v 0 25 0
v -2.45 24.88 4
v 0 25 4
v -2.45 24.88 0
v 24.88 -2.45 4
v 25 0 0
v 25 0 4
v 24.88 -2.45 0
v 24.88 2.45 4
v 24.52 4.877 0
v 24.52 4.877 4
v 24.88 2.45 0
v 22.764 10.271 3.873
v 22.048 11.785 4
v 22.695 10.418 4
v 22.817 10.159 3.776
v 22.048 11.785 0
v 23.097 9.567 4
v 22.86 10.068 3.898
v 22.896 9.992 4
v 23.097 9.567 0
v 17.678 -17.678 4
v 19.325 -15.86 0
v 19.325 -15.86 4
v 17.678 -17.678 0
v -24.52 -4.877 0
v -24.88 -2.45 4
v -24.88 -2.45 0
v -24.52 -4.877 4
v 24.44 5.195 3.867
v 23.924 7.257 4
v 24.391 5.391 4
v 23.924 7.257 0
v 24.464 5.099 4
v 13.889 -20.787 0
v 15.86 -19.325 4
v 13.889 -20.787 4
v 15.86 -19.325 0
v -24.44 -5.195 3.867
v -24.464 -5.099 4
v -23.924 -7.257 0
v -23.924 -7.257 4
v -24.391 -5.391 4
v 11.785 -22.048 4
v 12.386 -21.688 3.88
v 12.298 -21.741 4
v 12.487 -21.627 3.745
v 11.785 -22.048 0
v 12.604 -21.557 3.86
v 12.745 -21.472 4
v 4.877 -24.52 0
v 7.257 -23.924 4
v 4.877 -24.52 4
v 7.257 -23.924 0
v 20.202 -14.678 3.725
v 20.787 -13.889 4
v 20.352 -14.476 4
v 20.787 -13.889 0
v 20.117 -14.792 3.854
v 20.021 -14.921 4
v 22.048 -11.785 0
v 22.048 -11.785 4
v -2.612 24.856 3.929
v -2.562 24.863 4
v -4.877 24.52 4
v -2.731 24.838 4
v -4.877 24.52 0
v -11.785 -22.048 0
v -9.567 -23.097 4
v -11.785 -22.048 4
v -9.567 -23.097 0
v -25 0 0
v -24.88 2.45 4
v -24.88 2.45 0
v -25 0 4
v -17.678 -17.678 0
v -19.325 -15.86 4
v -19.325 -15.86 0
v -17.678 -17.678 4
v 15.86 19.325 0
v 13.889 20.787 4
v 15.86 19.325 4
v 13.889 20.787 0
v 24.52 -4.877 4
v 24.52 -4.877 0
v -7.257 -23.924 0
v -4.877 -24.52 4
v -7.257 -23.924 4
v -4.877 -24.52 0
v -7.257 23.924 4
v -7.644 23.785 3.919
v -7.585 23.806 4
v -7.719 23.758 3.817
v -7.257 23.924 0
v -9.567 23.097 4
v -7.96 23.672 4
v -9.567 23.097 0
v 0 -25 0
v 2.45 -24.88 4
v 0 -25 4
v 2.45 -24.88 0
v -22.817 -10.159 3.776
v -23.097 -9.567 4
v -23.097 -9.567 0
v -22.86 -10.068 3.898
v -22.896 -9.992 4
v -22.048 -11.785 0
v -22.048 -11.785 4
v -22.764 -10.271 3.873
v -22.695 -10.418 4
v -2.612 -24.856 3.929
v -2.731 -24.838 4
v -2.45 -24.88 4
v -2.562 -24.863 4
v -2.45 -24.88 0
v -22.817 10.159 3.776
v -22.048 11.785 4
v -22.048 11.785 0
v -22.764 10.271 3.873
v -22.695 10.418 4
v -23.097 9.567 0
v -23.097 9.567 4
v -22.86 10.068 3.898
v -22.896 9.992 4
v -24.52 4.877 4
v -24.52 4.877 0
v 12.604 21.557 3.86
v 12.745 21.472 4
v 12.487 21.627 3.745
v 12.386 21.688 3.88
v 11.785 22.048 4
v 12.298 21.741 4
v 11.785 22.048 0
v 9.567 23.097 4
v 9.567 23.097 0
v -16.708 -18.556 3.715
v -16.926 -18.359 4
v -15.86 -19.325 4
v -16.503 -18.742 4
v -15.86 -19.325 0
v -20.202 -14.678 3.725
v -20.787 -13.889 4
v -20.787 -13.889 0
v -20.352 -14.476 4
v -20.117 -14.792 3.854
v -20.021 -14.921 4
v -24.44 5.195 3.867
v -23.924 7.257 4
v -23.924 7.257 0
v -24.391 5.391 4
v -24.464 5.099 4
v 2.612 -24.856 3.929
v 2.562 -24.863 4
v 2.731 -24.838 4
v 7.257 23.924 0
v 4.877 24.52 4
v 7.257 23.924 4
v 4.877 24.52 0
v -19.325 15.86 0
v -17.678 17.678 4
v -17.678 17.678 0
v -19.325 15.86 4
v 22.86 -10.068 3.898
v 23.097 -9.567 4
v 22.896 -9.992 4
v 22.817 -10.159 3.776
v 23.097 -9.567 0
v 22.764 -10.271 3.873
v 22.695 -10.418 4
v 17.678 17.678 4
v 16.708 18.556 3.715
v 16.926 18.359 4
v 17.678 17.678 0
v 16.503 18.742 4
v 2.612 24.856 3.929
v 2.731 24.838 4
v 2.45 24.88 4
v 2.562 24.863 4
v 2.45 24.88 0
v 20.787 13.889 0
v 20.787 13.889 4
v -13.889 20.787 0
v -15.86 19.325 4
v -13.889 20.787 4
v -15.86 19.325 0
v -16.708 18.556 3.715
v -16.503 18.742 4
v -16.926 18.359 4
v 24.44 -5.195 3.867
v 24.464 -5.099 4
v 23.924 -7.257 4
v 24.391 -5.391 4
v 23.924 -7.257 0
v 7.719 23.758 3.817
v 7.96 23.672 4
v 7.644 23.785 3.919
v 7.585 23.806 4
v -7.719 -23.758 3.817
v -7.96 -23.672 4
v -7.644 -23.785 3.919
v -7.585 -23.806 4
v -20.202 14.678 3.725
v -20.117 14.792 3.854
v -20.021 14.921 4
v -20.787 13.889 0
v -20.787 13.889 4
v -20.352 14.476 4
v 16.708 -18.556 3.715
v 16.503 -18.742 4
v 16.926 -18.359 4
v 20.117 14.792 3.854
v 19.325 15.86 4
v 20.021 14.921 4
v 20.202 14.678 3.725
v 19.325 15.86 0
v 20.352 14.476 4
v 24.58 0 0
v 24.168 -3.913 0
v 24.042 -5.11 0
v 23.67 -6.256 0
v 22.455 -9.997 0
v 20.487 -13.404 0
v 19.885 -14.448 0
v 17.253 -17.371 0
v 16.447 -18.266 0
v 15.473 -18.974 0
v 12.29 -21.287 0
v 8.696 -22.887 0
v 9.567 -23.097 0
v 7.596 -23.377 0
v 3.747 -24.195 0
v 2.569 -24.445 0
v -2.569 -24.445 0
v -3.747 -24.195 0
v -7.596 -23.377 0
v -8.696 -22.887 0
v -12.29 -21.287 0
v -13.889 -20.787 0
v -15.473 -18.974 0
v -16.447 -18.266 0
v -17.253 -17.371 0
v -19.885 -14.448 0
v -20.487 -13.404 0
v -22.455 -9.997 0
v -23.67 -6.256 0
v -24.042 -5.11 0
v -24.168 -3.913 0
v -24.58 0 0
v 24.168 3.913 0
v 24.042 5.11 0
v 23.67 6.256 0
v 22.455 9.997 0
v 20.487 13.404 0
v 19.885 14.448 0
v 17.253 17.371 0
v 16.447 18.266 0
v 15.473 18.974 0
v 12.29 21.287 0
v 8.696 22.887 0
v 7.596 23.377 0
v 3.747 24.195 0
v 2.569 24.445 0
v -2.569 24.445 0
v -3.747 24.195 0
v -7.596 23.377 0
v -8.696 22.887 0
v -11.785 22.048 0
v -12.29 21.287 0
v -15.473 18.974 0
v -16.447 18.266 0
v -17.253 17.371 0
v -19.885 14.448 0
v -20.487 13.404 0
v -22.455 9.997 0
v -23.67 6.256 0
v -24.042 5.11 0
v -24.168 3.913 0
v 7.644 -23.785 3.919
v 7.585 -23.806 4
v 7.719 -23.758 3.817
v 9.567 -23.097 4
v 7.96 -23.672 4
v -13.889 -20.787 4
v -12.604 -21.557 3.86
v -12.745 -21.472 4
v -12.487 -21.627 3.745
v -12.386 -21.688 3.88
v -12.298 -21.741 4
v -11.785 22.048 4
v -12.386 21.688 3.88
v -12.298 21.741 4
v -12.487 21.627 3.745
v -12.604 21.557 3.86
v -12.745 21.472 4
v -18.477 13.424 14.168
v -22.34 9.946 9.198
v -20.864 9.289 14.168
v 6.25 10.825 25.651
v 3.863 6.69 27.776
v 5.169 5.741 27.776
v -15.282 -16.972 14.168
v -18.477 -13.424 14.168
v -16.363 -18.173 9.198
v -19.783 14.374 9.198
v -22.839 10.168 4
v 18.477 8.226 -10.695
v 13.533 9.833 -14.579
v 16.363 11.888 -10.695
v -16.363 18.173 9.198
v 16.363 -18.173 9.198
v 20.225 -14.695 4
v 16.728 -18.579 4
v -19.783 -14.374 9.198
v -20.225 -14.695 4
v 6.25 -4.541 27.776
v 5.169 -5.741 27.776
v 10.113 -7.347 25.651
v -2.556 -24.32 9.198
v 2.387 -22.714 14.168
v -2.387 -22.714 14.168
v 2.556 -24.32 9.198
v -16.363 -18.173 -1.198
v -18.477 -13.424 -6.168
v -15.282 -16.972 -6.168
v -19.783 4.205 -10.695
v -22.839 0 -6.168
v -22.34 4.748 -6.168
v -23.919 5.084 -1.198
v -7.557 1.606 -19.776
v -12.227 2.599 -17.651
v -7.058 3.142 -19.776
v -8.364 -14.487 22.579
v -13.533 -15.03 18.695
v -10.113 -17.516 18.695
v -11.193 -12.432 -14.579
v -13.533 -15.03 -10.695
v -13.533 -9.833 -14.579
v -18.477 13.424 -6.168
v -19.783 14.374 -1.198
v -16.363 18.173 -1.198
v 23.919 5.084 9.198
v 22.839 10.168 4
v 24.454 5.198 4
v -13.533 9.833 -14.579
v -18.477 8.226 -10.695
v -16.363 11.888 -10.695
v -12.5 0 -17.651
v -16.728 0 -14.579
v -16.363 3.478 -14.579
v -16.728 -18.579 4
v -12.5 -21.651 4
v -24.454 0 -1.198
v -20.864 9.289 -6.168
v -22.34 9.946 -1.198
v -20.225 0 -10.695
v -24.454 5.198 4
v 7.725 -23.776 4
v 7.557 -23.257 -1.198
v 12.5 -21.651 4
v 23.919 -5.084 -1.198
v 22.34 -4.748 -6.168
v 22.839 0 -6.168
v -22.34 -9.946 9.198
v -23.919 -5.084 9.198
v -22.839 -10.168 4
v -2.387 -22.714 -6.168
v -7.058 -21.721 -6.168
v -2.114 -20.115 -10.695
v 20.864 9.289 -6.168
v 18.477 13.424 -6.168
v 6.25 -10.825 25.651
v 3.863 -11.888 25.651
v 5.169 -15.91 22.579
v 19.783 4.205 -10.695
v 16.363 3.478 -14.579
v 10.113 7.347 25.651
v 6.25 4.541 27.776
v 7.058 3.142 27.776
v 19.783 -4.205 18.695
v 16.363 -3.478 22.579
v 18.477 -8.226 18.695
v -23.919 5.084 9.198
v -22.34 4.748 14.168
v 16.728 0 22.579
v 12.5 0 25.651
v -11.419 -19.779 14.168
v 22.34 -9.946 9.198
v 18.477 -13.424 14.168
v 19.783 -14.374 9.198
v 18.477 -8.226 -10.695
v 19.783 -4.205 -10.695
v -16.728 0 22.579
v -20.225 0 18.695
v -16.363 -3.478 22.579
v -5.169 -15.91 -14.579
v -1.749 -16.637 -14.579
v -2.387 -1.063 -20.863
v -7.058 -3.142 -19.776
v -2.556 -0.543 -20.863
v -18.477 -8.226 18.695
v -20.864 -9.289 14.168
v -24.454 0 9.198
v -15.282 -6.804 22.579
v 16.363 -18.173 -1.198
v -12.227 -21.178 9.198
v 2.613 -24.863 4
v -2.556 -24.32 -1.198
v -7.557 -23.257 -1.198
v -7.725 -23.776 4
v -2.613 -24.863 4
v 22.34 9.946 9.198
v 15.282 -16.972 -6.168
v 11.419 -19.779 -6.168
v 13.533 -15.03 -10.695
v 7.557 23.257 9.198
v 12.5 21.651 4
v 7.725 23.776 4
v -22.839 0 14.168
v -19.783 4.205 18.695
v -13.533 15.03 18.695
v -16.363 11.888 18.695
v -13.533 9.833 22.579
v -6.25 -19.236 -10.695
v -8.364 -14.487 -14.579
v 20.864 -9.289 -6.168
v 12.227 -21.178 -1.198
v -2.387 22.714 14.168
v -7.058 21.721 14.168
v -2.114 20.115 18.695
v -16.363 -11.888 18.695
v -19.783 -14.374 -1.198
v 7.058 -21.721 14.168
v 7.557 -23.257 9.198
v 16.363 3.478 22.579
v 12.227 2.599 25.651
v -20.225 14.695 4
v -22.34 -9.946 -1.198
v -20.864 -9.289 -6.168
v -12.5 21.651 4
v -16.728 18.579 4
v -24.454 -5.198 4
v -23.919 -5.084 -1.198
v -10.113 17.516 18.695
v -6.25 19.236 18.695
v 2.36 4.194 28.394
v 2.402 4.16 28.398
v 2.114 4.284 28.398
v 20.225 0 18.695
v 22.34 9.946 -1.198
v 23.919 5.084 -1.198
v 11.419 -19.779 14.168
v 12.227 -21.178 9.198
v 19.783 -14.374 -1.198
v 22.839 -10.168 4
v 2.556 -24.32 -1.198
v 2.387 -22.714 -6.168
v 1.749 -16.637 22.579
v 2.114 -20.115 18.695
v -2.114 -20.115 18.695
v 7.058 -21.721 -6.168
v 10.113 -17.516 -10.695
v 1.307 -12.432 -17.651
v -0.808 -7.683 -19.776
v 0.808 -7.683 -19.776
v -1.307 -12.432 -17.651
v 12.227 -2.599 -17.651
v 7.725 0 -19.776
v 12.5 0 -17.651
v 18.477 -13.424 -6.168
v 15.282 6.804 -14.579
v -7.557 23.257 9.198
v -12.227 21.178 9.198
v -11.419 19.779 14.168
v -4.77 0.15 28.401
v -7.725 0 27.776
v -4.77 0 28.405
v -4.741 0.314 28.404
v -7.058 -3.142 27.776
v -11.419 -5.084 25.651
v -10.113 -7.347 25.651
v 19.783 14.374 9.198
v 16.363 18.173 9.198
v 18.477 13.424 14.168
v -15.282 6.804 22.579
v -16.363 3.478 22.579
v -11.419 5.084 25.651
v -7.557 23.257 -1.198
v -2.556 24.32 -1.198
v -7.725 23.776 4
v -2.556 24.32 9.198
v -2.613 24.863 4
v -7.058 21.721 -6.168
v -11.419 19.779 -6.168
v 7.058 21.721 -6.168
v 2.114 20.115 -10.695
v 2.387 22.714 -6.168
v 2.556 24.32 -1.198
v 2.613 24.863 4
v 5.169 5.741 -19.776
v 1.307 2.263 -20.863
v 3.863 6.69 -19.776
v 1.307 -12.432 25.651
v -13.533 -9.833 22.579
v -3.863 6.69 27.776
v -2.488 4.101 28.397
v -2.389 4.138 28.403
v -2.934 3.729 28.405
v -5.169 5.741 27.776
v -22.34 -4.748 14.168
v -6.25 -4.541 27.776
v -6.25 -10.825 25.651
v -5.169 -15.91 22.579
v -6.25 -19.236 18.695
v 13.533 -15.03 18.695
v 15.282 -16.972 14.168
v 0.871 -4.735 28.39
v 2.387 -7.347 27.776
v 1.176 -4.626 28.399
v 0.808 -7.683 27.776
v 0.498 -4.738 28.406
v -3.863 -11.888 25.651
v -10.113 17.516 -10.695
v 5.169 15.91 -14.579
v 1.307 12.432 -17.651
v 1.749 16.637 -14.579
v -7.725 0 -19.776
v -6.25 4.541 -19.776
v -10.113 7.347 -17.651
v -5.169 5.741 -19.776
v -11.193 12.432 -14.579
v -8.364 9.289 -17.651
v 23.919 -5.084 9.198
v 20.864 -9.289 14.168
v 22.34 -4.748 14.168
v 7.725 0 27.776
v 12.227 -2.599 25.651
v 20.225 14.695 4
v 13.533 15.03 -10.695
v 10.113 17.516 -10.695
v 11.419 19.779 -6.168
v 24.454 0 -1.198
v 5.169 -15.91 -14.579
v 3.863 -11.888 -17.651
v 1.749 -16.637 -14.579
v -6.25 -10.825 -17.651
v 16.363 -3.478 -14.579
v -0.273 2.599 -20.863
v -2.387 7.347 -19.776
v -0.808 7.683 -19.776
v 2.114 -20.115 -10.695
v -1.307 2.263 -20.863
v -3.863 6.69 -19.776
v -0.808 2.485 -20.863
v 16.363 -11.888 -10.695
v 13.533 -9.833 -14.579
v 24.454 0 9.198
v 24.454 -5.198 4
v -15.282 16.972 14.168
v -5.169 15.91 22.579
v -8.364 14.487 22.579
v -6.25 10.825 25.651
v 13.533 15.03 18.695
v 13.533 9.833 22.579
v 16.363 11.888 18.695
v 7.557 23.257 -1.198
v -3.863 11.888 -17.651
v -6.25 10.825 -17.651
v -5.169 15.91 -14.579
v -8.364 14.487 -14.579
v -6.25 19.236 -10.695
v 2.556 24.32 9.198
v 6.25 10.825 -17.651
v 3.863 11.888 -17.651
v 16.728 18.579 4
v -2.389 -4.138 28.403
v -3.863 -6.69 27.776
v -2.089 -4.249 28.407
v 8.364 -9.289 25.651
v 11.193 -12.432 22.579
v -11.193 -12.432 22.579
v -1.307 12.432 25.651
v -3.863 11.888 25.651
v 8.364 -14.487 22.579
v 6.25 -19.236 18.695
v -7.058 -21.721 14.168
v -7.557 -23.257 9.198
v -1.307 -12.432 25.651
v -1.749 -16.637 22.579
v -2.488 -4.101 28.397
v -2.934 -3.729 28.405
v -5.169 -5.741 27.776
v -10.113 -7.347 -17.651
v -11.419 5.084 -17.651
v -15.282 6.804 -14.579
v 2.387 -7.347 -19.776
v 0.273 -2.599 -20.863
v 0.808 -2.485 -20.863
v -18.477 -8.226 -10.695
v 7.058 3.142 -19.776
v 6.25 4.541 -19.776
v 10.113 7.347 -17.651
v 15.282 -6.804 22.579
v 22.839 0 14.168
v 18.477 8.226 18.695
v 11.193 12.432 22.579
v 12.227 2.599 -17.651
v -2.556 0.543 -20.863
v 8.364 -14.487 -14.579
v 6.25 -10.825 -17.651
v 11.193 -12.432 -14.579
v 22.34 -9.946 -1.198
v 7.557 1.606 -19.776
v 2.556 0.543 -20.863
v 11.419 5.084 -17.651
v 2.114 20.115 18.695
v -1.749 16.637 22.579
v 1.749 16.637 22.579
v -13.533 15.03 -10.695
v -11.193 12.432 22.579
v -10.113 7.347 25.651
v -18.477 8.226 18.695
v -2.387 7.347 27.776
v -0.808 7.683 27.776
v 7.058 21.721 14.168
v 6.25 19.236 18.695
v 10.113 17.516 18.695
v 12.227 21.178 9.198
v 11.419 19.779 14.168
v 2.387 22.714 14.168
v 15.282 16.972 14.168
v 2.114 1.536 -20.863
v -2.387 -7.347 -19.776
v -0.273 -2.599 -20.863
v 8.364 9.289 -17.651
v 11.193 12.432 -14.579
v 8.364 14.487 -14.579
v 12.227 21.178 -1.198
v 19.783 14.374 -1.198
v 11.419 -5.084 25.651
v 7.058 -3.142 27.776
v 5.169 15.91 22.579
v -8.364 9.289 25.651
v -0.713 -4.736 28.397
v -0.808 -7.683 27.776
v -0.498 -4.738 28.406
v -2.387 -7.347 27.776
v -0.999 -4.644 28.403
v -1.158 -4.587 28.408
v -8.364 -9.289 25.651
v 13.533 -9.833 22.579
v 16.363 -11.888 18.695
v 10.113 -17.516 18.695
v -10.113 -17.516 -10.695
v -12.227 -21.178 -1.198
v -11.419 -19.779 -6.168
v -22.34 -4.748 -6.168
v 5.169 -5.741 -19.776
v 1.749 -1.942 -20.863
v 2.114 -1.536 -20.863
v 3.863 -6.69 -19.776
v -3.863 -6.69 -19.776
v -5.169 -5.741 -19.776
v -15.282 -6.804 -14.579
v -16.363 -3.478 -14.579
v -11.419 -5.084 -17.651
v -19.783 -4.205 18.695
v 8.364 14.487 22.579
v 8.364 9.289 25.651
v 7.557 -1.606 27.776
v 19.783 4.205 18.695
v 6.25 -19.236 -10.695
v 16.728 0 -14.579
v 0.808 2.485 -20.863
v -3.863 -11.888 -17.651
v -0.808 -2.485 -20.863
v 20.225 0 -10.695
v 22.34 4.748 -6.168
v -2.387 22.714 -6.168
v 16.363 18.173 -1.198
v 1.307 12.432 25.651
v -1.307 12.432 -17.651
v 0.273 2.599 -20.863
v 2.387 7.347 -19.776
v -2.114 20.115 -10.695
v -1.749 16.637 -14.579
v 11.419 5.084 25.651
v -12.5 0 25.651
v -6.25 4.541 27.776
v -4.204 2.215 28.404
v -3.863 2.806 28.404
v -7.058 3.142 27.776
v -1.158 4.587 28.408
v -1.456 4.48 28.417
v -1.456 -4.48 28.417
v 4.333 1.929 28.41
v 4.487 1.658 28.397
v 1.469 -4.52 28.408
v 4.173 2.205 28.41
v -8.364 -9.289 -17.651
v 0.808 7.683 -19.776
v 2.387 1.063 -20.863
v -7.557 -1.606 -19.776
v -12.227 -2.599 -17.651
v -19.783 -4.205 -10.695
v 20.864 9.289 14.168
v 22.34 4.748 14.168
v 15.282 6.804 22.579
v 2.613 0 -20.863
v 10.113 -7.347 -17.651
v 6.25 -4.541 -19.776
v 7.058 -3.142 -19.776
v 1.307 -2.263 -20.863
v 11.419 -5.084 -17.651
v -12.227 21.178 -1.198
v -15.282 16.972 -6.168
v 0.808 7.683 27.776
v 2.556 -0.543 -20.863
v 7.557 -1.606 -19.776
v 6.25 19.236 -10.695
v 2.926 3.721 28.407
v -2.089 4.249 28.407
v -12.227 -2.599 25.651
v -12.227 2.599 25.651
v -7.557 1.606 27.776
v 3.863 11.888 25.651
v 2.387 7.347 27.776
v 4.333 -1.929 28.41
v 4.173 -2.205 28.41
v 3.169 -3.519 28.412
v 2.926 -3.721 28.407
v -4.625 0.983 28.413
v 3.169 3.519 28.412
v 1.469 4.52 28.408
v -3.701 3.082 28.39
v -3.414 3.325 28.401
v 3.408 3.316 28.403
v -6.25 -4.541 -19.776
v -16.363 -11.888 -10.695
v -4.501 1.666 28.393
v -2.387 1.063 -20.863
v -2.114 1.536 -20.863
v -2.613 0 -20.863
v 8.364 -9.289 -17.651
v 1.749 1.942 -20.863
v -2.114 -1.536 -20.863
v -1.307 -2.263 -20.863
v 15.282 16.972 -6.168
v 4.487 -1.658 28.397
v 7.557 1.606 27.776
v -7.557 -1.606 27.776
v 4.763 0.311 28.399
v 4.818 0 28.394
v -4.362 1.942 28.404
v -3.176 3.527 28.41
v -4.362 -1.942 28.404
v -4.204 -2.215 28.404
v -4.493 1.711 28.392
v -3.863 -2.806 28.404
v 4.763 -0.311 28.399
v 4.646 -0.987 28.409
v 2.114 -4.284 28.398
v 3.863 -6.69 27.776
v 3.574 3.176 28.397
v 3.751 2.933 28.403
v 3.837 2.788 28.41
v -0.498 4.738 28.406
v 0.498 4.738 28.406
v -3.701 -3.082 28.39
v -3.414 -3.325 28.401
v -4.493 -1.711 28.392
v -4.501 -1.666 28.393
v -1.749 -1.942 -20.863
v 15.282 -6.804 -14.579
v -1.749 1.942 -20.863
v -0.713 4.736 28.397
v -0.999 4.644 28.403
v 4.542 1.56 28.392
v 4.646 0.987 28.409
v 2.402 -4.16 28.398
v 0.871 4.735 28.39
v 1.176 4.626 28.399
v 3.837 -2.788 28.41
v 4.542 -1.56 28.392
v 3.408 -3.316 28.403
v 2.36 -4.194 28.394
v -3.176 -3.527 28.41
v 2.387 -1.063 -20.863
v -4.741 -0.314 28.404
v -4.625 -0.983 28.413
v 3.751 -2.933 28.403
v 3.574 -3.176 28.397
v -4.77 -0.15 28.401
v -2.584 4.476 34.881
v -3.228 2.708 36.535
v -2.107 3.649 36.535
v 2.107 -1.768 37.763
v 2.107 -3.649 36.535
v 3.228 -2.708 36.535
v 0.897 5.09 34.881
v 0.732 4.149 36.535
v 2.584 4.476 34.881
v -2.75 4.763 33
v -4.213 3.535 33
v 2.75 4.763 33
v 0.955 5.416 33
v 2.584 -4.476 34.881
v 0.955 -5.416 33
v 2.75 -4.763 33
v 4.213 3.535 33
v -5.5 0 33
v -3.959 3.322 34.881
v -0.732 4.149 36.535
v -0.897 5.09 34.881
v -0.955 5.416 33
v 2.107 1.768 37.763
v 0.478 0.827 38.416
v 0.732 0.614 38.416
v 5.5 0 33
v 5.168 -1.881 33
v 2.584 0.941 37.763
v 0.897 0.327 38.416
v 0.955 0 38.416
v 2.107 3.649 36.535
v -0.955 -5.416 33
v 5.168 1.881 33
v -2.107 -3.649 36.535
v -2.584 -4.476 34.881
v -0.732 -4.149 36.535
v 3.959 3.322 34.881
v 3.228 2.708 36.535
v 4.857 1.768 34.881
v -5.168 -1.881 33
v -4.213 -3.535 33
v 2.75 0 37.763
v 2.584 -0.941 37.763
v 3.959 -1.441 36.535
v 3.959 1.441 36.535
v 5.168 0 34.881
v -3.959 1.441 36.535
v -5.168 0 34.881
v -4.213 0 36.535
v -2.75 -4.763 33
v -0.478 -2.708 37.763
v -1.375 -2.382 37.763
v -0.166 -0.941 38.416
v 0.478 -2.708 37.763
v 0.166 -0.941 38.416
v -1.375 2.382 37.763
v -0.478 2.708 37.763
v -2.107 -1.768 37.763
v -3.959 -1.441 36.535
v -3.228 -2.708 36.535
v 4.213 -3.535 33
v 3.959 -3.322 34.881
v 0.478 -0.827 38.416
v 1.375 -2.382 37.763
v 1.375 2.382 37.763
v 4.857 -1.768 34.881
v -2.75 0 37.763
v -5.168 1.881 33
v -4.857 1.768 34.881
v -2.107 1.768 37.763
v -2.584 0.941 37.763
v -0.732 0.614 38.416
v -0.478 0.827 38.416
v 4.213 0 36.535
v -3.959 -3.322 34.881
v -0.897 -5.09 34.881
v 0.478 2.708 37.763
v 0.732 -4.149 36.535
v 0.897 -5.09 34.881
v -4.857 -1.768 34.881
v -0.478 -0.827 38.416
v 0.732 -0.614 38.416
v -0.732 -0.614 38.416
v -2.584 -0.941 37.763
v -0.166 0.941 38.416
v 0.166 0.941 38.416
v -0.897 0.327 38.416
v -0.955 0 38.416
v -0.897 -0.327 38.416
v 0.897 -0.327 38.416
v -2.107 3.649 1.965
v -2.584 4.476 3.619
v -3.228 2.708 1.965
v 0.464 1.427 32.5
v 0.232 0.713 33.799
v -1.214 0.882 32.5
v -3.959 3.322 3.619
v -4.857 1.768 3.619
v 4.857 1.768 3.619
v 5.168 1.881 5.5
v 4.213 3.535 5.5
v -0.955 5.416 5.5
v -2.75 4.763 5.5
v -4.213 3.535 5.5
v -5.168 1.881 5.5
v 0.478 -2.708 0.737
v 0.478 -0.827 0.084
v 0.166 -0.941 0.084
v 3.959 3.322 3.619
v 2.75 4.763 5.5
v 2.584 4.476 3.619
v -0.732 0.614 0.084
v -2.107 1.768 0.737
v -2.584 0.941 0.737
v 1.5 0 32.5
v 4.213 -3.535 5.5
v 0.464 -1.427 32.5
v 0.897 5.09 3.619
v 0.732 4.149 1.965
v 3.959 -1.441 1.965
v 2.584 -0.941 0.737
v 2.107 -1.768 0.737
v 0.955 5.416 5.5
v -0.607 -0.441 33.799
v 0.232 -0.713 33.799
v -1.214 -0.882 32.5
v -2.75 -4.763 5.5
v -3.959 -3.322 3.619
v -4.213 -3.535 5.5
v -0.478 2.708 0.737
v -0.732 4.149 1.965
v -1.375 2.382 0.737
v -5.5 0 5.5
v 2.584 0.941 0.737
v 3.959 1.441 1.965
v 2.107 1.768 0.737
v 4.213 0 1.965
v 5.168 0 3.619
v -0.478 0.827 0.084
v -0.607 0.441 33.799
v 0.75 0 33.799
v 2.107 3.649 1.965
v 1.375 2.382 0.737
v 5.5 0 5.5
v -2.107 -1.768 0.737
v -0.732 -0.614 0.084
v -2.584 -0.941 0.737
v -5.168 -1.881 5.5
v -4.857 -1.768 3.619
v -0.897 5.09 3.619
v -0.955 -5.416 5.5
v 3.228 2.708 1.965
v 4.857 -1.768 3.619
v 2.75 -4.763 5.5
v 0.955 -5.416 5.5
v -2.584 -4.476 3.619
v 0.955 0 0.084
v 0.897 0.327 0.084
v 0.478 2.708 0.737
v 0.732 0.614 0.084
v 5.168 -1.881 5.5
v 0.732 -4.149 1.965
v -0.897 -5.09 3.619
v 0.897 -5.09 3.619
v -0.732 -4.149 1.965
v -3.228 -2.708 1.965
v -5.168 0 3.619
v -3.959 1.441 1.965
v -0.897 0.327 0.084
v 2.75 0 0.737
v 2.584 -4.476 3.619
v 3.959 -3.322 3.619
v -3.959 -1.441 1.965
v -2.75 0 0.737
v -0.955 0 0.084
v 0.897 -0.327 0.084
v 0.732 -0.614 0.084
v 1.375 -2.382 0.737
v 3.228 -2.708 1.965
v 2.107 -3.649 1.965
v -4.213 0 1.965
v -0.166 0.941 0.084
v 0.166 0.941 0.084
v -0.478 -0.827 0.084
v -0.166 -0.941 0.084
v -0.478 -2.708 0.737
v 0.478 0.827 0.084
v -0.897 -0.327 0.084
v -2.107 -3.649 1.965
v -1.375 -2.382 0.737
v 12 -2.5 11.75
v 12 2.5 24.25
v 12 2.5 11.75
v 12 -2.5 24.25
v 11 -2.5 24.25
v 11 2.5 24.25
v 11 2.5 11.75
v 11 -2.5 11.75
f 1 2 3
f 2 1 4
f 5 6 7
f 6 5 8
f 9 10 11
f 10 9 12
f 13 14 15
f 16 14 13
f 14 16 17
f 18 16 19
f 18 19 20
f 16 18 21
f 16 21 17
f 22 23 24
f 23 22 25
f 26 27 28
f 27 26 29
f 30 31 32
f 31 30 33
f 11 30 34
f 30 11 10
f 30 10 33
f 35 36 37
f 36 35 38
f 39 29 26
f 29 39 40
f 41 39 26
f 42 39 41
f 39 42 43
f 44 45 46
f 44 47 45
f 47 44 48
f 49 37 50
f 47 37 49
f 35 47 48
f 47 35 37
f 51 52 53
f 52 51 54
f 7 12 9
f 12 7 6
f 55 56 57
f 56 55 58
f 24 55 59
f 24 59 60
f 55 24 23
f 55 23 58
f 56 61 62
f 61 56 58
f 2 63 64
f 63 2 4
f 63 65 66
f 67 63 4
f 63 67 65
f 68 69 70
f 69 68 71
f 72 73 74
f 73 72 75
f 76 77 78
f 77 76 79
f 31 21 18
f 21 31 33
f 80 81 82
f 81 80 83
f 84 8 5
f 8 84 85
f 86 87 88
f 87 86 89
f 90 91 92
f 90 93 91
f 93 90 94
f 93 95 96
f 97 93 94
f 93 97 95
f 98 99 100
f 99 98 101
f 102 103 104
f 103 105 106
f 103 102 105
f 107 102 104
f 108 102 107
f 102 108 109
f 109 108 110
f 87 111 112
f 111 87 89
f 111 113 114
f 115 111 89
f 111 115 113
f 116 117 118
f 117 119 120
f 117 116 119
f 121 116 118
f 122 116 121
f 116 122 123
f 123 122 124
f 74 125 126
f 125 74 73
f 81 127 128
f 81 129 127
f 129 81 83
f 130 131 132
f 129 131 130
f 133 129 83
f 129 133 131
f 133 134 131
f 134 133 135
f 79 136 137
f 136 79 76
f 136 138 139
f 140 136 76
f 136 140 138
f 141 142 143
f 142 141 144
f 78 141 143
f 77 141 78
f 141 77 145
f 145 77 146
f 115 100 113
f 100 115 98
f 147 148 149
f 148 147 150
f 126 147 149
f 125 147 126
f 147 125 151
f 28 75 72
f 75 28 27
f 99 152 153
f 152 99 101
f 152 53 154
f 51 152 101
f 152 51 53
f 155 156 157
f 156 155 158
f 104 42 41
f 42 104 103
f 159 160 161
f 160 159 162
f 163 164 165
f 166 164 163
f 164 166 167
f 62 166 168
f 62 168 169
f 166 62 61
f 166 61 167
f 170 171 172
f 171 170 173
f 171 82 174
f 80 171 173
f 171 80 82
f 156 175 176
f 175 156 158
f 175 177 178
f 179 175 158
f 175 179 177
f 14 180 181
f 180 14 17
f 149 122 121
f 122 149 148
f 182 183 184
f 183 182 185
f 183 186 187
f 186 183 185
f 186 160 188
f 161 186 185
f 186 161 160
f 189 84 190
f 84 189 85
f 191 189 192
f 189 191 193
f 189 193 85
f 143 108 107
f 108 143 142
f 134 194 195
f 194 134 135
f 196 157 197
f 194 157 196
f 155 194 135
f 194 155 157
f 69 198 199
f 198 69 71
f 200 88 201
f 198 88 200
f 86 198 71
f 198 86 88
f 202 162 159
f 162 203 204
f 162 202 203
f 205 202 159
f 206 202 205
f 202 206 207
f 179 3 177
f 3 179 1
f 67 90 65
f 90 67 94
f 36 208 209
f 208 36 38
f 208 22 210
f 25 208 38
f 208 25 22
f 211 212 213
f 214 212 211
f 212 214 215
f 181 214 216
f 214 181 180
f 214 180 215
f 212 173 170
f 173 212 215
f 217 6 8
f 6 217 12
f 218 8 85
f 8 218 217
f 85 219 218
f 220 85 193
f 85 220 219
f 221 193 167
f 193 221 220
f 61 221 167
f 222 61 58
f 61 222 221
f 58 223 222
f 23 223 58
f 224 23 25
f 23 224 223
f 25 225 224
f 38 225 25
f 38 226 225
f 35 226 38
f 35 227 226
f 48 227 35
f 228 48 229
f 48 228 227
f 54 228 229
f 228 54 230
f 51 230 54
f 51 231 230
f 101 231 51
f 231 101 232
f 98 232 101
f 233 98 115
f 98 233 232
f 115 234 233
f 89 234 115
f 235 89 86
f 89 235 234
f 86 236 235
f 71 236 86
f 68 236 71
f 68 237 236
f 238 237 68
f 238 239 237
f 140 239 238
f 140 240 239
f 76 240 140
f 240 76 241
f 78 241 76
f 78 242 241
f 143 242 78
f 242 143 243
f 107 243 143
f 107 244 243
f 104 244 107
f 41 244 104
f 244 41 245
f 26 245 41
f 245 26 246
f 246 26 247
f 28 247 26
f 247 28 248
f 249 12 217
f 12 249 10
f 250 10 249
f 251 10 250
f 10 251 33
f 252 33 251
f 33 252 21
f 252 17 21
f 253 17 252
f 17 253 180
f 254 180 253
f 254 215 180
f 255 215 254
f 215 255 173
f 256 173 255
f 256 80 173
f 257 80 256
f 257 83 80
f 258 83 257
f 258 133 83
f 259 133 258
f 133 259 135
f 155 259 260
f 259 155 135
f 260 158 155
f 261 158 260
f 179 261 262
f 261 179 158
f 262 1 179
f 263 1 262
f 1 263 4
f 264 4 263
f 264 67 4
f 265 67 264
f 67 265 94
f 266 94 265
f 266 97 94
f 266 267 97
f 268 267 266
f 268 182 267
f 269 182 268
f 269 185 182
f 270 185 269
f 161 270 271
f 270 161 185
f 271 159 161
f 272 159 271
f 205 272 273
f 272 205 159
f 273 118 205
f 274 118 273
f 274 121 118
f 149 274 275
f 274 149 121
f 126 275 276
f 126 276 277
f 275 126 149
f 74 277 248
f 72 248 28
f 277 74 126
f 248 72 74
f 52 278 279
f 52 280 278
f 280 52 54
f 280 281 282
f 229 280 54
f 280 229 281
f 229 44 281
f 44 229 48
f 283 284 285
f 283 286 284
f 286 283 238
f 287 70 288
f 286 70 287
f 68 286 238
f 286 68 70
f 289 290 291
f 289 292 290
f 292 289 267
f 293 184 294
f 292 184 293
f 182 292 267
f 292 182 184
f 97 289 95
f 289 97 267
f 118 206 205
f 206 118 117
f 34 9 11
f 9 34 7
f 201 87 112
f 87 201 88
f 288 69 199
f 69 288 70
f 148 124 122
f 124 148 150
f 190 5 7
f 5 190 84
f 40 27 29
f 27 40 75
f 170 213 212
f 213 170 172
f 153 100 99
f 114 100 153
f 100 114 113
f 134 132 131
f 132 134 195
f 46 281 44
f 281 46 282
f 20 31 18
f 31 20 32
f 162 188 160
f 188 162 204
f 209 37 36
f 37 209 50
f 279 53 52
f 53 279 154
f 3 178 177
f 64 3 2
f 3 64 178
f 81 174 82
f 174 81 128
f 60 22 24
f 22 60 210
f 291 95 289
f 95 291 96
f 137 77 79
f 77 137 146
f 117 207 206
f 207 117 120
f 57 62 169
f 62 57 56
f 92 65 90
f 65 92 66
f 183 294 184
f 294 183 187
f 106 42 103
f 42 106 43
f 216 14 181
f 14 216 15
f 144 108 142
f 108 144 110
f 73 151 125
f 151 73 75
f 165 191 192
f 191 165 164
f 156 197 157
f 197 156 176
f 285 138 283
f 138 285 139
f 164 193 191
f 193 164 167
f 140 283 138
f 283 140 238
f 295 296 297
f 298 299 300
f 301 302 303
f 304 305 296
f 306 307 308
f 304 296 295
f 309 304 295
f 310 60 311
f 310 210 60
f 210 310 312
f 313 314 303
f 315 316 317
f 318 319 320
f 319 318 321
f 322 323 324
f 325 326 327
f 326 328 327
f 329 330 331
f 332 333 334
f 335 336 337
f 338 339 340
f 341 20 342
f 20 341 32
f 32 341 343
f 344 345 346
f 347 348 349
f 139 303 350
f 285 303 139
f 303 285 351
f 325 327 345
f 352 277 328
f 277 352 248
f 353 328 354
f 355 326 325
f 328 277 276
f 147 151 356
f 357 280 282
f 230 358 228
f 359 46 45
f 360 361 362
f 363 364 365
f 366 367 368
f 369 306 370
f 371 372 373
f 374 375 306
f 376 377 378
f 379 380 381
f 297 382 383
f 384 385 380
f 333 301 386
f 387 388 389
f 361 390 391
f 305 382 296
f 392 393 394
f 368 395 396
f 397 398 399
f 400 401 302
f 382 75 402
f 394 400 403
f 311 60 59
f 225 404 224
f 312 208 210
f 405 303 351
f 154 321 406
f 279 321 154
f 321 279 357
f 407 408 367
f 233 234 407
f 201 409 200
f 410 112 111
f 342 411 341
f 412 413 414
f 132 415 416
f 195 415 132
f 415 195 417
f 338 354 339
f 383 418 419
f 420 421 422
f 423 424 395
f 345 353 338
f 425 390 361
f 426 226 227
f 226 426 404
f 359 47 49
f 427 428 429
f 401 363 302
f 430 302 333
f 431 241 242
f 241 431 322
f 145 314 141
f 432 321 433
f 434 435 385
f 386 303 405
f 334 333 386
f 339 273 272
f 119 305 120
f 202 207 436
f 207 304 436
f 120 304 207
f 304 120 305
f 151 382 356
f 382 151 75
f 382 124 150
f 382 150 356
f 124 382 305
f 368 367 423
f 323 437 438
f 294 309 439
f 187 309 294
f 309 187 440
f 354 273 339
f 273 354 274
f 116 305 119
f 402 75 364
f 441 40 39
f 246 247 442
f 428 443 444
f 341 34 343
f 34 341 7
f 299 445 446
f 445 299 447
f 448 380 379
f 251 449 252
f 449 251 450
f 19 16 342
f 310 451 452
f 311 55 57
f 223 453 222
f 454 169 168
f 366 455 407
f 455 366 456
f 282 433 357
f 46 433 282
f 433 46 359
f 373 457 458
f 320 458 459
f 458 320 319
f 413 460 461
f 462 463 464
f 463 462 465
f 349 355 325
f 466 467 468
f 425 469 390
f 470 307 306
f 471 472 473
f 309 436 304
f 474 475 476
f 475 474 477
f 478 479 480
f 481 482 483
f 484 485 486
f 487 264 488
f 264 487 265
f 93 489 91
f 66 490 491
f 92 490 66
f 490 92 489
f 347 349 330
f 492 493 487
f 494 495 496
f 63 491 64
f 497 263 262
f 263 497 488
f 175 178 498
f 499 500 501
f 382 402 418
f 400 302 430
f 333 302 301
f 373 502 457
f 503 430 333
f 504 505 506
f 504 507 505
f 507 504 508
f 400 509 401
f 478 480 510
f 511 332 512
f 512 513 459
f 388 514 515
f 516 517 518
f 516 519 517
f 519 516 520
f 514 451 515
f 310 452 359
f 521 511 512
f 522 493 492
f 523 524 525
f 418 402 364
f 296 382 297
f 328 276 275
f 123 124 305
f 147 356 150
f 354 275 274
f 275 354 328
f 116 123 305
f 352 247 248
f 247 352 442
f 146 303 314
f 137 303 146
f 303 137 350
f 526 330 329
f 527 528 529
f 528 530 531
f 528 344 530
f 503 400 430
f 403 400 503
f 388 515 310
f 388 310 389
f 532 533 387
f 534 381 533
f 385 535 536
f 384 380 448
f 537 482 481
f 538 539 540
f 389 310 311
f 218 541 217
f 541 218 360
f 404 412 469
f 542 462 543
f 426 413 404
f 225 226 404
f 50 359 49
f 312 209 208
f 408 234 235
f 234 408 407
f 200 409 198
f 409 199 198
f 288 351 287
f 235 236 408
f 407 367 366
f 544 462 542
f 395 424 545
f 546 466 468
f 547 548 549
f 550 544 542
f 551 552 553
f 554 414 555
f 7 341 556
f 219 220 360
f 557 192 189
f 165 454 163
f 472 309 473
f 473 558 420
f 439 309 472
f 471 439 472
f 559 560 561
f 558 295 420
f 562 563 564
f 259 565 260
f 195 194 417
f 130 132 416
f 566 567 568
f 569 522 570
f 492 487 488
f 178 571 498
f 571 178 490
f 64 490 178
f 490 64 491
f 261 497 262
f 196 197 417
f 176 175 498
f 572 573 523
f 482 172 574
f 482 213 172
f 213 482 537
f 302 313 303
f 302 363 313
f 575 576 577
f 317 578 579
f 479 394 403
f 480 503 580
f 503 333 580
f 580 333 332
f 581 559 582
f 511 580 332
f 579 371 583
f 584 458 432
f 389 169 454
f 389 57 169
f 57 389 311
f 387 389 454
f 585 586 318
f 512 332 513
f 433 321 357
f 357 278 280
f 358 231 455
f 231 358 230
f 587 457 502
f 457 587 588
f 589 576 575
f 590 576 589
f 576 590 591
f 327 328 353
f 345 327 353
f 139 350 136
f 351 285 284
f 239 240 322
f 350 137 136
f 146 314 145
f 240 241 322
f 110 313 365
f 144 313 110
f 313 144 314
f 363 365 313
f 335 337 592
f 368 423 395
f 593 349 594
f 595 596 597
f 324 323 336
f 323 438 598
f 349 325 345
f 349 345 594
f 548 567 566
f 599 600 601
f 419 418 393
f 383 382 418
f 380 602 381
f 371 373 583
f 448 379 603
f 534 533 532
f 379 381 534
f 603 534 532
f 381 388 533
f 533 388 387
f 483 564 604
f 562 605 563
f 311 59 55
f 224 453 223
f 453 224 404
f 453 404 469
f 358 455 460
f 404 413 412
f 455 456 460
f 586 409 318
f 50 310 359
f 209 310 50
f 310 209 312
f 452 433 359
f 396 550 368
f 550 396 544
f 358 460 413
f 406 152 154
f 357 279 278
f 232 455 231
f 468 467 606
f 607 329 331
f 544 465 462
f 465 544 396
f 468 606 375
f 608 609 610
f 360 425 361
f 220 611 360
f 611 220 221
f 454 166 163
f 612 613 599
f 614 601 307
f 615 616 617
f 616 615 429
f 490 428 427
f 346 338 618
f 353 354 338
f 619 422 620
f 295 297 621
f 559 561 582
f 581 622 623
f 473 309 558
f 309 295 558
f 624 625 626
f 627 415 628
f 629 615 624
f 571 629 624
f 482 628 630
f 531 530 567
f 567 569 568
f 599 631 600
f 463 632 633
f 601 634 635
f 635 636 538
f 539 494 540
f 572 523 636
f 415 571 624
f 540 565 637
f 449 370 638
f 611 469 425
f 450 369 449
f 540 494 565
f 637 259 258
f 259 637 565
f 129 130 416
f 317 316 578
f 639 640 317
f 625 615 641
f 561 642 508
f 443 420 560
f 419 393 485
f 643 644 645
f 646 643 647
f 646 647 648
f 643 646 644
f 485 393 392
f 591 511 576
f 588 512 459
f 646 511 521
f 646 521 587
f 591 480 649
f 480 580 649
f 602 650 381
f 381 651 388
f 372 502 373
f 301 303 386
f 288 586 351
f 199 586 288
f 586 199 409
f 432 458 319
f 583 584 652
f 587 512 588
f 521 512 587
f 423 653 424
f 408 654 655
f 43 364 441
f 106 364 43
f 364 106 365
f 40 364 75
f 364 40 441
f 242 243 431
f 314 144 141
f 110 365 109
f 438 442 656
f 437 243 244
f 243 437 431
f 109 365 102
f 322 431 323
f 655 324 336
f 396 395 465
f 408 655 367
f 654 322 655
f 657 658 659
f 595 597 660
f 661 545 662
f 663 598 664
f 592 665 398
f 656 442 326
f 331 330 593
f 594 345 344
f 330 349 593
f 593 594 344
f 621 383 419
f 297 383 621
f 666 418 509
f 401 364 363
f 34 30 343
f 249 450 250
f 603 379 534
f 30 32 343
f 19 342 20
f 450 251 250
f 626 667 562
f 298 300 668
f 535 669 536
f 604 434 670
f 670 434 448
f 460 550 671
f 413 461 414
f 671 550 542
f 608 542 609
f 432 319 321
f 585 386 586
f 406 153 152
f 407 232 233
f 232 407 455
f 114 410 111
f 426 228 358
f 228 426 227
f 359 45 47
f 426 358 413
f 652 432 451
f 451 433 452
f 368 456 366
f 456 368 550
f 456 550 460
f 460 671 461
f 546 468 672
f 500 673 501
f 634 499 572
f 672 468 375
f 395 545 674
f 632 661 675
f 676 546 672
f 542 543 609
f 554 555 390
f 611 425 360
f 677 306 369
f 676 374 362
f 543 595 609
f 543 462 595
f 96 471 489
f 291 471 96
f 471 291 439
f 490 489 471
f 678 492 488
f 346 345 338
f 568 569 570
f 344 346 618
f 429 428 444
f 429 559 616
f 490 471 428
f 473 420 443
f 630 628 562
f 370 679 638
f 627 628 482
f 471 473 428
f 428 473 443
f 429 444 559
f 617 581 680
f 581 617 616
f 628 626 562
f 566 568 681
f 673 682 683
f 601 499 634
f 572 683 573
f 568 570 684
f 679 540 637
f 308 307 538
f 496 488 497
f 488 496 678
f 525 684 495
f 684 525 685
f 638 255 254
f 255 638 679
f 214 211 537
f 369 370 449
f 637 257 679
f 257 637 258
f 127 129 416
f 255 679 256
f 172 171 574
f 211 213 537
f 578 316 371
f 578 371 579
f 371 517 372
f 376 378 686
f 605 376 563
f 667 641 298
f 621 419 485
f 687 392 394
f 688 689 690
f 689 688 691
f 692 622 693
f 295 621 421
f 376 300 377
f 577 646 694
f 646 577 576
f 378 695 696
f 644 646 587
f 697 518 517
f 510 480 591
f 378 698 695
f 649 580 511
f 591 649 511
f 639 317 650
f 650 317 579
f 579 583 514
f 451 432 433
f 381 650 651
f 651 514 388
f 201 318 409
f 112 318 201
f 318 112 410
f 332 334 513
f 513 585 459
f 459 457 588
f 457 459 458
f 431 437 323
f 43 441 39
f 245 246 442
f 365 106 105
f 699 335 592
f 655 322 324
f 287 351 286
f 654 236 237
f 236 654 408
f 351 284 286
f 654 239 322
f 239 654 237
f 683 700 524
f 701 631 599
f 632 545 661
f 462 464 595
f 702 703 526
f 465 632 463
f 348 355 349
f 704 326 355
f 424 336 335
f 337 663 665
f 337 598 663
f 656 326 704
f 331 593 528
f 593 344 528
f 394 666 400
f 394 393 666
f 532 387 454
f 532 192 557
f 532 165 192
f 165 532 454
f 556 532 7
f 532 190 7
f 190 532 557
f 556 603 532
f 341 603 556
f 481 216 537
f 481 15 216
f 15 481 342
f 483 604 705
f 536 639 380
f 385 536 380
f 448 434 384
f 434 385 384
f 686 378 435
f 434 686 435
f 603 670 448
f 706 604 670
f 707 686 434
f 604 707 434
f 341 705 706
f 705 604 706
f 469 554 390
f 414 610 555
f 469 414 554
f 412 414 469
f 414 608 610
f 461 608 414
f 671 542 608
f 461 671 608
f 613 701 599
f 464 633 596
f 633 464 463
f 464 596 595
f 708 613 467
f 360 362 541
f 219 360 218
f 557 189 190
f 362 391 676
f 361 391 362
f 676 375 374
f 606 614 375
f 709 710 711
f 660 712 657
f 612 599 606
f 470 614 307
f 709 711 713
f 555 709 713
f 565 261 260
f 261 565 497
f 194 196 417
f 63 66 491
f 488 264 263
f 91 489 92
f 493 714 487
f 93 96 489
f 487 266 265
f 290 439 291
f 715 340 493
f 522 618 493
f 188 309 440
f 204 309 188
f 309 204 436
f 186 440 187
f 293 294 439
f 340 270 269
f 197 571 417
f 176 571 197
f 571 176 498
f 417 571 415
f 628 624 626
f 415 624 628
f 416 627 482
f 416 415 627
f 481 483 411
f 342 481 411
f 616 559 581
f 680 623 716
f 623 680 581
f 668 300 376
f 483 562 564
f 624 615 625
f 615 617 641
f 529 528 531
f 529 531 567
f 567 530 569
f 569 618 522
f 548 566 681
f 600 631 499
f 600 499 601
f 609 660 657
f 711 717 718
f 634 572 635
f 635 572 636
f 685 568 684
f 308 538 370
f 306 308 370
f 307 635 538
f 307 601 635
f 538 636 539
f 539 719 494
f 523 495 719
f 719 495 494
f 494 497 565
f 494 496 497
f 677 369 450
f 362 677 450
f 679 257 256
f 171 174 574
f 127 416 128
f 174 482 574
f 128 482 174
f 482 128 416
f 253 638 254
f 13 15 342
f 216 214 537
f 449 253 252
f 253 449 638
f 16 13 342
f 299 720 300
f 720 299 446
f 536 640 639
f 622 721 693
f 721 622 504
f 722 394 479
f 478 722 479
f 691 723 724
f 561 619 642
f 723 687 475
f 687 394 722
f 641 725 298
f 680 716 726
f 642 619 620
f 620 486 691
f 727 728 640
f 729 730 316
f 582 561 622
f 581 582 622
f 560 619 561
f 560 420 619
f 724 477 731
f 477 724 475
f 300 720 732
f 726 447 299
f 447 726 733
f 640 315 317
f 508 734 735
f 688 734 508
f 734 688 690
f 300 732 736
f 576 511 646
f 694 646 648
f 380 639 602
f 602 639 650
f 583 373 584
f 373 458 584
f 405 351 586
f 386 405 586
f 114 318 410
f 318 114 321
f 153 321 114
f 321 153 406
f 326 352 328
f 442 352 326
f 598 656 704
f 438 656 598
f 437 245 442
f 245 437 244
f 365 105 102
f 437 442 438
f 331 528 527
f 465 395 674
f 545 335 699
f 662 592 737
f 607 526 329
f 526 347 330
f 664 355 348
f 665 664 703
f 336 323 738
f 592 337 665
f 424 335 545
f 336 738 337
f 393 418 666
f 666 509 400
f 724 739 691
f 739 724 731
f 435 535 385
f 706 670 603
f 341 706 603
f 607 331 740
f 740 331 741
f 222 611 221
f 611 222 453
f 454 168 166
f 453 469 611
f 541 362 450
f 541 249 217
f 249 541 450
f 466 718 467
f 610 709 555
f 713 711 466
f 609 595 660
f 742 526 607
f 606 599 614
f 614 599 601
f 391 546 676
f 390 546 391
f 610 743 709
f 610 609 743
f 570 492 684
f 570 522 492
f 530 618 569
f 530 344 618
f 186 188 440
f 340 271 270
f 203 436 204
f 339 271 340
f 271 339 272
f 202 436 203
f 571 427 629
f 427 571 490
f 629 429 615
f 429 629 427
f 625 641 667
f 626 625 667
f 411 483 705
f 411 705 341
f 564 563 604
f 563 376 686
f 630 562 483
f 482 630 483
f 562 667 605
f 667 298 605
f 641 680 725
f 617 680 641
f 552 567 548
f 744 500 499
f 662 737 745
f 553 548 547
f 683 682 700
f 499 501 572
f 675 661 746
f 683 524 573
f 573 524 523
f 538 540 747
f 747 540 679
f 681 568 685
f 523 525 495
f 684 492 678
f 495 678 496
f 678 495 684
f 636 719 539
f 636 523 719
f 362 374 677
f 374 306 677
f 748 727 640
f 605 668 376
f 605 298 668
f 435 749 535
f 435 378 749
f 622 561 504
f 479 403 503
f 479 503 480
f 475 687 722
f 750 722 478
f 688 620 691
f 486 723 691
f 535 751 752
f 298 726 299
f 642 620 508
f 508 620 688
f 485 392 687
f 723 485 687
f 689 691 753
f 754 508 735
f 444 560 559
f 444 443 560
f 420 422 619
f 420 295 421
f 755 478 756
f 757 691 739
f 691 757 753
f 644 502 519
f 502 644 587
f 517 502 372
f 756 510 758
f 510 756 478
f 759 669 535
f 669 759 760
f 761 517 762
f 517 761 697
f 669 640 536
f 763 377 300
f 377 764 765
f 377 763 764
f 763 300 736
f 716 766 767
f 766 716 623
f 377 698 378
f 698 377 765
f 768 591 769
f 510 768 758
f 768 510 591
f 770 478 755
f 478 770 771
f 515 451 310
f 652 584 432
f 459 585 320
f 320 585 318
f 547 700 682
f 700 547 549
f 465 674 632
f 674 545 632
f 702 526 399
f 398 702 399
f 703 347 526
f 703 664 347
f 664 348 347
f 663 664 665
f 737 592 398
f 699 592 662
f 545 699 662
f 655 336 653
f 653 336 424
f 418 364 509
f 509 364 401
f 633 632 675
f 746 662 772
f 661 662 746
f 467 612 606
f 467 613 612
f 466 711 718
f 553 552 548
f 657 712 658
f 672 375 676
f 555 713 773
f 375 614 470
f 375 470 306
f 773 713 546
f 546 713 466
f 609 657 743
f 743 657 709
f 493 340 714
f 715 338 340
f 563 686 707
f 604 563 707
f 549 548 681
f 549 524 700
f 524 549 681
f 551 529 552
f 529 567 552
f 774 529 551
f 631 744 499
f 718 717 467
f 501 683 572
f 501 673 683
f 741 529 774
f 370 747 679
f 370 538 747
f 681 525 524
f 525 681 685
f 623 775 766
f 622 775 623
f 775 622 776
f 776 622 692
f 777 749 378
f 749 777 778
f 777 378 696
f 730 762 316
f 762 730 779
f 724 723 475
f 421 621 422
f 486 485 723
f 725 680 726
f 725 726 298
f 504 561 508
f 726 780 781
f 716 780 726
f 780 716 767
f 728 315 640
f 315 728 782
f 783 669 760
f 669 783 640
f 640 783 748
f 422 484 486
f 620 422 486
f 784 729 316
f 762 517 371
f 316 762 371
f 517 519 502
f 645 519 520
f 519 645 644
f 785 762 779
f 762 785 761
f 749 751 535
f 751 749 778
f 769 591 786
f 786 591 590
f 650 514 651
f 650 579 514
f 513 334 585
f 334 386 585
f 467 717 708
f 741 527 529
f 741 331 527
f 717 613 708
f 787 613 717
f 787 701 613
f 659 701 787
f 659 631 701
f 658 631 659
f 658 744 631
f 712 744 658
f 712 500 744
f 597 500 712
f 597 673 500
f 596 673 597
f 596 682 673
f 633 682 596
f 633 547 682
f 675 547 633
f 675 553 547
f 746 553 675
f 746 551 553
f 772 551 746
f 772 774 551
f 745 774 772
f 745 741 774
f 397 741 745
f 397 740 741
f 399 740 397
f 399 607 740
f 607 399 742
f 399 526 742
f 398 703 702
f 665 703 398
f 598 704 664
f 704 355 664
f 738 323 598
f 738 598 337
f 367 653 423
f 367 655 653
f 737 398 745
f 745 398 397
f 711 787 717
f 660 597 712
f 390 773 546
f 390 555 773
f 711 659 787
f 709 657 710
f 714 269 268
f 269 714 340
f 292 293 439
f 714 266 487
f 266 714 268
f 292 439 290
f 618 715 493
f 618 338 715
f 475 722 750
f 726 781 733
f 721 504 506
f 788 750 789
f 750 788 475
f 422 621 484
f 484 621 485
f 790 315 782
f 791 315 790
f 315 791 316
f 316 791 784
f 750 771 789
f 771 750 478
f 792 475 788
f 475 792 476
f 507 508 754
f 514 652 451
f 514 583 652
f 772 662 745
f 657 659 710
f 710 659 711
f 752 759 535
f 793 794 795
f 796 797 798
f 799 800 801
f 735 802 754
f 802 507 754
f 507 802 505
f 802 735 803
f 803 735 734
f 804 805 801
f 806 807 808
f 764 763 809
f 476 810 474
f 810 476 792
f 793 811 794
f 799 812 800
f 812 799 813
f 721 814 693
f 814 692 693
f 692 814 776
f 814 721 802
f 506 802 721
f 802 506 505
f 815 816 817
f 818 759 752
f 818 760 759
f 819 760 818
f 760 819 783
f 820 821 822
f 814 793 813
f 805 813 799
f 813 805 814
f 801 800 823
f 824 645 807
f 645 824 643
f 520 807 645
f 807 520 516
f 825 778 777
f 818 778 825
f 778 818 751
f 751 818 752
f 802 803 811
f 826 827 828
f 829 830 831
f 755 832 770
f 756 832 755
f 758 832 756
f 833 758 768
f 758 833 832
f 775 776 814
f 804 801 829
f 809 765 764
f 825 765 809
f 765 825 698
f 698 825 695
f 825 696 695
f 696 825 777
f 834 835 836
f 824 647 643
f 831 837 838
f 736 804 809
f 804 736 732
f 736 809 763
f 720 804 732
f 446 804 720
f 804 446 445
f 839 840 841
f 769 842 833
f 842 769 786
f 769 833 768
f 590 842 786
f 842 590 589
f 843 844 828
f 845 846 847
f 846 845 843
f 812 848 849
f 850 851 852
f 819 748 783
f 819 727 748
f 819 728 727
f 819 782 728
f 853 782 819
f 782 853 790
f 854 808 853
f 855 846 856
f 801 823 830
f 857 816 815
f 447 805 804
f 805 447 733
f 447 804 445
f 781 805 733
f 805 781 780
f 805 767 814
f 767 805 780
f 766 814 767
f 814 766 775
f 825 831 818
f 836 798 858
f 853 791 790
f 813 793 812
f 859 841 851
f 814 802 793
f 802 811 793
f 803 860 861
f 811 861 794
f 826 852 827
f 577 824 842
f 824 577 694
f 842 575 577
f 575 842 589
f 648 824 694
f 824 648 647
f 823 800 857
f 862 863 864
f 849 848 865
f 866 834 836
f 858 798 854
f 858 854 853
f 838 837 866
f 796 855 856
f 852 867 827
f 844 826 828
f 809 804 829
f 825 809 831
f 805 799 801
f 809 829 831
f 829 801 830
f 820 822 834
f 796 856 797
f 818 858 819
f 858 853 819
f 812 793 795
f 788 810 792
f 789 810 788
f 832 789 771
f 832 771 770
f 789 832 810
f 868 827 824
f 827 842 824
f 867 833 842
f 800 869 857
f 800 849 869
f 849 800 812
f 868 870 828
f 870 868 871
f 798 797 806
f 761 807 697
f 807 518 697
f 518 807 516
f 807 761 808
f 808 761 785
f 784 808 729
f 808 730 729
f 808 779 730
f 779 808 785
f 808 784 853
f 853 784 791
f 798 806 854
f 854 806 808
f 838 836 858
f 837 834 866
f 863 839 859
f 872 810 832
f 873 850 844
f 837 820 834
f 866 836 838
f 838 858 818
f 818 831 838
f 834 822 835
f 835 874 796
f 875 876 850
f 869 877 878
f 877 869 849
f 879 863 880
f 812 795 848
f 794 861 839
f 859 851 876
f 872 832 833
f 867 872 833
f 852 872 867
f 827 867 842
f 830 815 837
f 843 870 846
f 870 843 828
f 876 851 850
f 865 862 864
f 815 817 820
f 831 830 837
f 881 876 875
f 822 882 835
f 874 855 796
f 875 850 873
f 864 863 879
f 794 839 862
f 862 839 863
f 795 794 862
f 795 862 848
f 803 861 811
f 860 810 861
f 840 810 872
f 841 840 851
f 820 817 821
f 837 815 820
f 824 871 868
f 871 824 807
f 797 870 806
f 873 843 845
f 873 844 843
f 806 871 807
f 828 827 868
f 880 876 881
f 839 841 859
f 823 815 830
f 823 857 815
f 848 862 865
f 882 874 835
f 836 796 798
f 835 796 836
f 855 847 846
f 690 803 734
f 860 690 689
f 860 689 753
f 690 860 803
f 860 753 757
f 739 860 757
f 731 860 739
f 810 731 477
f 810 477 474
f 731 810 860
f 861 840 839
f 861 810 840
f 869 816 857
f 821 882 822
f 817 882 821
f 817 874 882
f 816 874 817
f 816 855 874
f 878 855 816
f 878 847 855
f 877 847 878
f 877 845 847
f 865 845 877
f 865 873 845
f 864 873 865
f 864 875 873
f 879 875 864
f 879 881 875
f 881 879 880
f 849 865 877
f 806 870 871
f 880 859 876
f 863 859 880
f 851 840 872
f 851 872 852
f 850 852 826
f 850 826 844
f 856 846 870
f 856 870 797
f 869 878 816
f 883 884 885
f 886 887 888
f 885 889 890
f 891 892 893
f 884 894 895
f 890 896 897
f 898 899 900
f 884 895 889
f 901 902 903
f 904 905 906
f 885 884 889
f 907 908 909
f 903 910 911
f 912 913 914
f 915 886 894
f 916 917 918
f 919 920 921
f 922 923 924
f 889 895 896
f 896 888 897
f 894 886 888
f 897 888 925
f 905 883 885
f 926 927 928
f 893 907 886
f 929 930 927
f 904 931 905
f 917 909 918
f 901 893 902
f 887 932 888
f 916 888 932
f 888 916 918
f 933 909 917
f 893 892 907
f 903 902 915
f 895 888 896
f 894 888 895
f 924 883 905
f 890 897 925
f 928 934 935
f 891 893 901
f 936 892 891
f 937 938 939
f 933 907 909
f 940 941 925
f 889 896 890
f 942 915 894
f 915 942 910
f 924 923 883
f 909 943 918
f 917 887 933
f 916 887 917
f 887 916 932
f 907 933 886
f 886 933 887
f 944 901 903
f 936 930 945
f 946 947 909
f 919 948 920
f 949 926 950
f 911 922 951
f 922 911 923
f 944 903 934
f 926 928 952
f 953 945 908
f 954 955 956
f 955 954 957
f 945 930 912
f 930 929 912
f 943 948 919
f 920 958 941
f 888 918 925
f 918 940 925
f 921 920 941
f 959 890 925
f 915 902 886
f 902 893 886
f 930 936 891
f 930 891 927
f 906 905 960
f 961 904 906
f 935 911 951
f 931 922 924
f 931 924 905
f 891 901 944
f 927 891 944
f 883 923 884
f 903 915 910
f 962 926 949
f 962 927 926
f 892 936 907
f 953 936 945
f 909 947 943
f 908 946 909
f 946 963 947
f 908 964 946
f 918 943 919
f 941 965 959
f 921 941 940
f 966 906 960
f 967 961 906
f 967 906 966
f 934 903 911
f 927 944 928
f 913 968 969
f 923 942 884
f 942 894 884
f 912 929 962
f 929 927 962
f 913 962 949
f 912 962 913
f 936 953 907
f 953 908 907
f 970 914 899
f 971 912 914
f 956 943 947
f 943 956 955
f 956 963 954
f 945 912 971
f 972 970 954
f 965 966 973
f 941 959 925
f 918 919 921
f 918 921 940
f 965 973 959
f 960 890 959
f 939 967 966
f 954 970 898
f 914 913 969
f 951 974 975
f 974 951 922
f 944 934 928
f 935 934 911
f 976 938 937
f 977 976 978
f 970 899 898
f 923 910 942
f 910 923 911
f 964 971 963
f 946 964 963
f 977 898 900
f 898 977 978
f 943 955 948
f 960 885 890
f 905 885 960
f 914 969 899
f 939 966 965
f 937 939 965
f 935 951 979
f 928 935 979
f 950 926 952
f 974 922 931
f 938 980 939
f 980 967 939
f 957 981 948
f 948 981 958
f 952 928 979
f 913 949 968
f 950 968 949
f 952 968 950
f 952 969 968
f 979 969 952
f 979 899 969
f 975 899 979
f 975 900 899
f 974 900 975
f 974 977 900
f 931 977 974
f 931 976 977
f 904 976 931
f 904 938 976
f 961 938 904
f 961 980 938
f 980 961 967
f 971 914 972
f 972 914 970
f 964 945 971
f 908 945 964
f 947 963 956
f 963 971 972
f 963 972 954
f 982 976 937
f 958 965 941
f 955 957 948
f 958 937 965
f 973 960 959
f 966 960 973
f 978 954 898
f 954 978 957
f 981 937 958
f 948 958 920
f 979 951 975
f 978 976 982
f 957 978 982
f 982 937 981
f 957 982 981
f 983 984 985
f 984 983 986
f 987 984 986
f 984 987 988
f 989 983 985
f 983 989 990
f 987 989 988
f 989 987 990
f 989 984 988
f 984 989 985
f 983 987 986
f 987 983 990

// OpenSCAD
// --- Dimensions in mm ---

// Base dimensions
base_diameter = 50;      // Diameter of the base disc
base_height = 4;          // Height of the base disc

// Cone dimensions (Base to Column)
cone_start_z = 4;         // Z where cone starts
cone_end_z = 14;          // Z where cone ends
cone_start_diameter = 50; // Diameter at z=4
cone_end_diameter = 22;   // Diameter at z=14

// Column dimensions (Cylinder section)
column_height = 33 - 14;  // Height of the main column (from z=14 to z=33)
column_diameter = 22;     // Diameter of the column

// Tube Seat dimensions
seat_start_z = 33;        // Z where tube seat starts
seat_end_z = 6;           // Z where tube seat ends (Bottom tip is at z=6)
seat_diameter_top = 11;   // Diameter at z=33
seat_diameter_bottom = 3; // Diameter at z=6

// Viewing Window dimensions
window_width = 4;         // Width of the viewing window in Y direction
window_start_z = 18;      // Start Z for window cut
window_end_z = 30;        // End Z for window cut

// Tolerance for cutting operations (to avoid coplanar faces)
tolerance = 0.5;


// --- Main Assembly ---

difference() {
    // 1. Base Disc and Structure (Solid part)
    union() {
        // Base disc (Z=0 to Z=4)
        cylinder(h = base_height, r = base_diameter / 2, $fn = 64);

        // Cone section (Z=4 to Z=14) - Approximated using hull of two spheres/disks for smooth transition
        hull() {
            translate([0, 0, cone_start_z]) sphere(r = cone_start_diameter / 2);
            translate([0, 0, cone_end_z]) sphere(r = cone_end_diameter / 2);
        }

        // Column section (Z=14 to Z=33) - Cylinder
        cylinder(h = column_height, r = column_diameter / 2, $fn = 64);

        // Tube Seat Section (Tapered shape from z=33 down to z=6). We use hull between the top and bottom points.
        hull() {
            translate([0, 0, seat_start_z]) sphere(r = seat_diameter_top / 2);
            // The lowest point of the seat is at Z=6. We place the second sphere there.
            translate([0, 0, seat_end_z]) sphere(r = seat_diameter_bottom / 2);
        }

    } // End of solid union

    // --- Subtractions (Holes and Windows) ---

    // 2. Tube Seat Cavity Cutout: We subtract the volume defined by the seat profile, ensuring it cuts through the structure below Z=6 if necessary.
    // The cavity must extend from Z=33 down to Z=6.
    translate([0, 0, seat_end_z - tolerance]) { // Start cutting slightly below the lowest point of the seat (Z=6)
        hull() {
            translate([0, 0, 0]) sphere(r = seat_diameter_top / 2);
            // The height difference between the two spheres in this hull operation is (seat_start_z - seat_end_z).
            // We must translate the second sphere correctly relative to the start of the hull operation.
            translate([0, 0, seat_start_z - seat_end_z]) sphere(r = seat_diameter_bottom / 2);
        }
    }


    // 3. Viewing Window Cutout (Through the main column wall)
    // The window is cut through the column wall between Z=18 and Z=30, on the +X side.
    translate([column_diameter/2 + tolerance, 0, window_start_z]) { // Position cut on the +X side wall (center of cylinder radius)
        // The cube must be wide enough in Y to cover the specified width (4mm) and tall enough for the Z range.
        cube([tolerance * 2, window_width + tolerance*2, window_end_z - window_start_z + tolerance], center = true);
    }

}
